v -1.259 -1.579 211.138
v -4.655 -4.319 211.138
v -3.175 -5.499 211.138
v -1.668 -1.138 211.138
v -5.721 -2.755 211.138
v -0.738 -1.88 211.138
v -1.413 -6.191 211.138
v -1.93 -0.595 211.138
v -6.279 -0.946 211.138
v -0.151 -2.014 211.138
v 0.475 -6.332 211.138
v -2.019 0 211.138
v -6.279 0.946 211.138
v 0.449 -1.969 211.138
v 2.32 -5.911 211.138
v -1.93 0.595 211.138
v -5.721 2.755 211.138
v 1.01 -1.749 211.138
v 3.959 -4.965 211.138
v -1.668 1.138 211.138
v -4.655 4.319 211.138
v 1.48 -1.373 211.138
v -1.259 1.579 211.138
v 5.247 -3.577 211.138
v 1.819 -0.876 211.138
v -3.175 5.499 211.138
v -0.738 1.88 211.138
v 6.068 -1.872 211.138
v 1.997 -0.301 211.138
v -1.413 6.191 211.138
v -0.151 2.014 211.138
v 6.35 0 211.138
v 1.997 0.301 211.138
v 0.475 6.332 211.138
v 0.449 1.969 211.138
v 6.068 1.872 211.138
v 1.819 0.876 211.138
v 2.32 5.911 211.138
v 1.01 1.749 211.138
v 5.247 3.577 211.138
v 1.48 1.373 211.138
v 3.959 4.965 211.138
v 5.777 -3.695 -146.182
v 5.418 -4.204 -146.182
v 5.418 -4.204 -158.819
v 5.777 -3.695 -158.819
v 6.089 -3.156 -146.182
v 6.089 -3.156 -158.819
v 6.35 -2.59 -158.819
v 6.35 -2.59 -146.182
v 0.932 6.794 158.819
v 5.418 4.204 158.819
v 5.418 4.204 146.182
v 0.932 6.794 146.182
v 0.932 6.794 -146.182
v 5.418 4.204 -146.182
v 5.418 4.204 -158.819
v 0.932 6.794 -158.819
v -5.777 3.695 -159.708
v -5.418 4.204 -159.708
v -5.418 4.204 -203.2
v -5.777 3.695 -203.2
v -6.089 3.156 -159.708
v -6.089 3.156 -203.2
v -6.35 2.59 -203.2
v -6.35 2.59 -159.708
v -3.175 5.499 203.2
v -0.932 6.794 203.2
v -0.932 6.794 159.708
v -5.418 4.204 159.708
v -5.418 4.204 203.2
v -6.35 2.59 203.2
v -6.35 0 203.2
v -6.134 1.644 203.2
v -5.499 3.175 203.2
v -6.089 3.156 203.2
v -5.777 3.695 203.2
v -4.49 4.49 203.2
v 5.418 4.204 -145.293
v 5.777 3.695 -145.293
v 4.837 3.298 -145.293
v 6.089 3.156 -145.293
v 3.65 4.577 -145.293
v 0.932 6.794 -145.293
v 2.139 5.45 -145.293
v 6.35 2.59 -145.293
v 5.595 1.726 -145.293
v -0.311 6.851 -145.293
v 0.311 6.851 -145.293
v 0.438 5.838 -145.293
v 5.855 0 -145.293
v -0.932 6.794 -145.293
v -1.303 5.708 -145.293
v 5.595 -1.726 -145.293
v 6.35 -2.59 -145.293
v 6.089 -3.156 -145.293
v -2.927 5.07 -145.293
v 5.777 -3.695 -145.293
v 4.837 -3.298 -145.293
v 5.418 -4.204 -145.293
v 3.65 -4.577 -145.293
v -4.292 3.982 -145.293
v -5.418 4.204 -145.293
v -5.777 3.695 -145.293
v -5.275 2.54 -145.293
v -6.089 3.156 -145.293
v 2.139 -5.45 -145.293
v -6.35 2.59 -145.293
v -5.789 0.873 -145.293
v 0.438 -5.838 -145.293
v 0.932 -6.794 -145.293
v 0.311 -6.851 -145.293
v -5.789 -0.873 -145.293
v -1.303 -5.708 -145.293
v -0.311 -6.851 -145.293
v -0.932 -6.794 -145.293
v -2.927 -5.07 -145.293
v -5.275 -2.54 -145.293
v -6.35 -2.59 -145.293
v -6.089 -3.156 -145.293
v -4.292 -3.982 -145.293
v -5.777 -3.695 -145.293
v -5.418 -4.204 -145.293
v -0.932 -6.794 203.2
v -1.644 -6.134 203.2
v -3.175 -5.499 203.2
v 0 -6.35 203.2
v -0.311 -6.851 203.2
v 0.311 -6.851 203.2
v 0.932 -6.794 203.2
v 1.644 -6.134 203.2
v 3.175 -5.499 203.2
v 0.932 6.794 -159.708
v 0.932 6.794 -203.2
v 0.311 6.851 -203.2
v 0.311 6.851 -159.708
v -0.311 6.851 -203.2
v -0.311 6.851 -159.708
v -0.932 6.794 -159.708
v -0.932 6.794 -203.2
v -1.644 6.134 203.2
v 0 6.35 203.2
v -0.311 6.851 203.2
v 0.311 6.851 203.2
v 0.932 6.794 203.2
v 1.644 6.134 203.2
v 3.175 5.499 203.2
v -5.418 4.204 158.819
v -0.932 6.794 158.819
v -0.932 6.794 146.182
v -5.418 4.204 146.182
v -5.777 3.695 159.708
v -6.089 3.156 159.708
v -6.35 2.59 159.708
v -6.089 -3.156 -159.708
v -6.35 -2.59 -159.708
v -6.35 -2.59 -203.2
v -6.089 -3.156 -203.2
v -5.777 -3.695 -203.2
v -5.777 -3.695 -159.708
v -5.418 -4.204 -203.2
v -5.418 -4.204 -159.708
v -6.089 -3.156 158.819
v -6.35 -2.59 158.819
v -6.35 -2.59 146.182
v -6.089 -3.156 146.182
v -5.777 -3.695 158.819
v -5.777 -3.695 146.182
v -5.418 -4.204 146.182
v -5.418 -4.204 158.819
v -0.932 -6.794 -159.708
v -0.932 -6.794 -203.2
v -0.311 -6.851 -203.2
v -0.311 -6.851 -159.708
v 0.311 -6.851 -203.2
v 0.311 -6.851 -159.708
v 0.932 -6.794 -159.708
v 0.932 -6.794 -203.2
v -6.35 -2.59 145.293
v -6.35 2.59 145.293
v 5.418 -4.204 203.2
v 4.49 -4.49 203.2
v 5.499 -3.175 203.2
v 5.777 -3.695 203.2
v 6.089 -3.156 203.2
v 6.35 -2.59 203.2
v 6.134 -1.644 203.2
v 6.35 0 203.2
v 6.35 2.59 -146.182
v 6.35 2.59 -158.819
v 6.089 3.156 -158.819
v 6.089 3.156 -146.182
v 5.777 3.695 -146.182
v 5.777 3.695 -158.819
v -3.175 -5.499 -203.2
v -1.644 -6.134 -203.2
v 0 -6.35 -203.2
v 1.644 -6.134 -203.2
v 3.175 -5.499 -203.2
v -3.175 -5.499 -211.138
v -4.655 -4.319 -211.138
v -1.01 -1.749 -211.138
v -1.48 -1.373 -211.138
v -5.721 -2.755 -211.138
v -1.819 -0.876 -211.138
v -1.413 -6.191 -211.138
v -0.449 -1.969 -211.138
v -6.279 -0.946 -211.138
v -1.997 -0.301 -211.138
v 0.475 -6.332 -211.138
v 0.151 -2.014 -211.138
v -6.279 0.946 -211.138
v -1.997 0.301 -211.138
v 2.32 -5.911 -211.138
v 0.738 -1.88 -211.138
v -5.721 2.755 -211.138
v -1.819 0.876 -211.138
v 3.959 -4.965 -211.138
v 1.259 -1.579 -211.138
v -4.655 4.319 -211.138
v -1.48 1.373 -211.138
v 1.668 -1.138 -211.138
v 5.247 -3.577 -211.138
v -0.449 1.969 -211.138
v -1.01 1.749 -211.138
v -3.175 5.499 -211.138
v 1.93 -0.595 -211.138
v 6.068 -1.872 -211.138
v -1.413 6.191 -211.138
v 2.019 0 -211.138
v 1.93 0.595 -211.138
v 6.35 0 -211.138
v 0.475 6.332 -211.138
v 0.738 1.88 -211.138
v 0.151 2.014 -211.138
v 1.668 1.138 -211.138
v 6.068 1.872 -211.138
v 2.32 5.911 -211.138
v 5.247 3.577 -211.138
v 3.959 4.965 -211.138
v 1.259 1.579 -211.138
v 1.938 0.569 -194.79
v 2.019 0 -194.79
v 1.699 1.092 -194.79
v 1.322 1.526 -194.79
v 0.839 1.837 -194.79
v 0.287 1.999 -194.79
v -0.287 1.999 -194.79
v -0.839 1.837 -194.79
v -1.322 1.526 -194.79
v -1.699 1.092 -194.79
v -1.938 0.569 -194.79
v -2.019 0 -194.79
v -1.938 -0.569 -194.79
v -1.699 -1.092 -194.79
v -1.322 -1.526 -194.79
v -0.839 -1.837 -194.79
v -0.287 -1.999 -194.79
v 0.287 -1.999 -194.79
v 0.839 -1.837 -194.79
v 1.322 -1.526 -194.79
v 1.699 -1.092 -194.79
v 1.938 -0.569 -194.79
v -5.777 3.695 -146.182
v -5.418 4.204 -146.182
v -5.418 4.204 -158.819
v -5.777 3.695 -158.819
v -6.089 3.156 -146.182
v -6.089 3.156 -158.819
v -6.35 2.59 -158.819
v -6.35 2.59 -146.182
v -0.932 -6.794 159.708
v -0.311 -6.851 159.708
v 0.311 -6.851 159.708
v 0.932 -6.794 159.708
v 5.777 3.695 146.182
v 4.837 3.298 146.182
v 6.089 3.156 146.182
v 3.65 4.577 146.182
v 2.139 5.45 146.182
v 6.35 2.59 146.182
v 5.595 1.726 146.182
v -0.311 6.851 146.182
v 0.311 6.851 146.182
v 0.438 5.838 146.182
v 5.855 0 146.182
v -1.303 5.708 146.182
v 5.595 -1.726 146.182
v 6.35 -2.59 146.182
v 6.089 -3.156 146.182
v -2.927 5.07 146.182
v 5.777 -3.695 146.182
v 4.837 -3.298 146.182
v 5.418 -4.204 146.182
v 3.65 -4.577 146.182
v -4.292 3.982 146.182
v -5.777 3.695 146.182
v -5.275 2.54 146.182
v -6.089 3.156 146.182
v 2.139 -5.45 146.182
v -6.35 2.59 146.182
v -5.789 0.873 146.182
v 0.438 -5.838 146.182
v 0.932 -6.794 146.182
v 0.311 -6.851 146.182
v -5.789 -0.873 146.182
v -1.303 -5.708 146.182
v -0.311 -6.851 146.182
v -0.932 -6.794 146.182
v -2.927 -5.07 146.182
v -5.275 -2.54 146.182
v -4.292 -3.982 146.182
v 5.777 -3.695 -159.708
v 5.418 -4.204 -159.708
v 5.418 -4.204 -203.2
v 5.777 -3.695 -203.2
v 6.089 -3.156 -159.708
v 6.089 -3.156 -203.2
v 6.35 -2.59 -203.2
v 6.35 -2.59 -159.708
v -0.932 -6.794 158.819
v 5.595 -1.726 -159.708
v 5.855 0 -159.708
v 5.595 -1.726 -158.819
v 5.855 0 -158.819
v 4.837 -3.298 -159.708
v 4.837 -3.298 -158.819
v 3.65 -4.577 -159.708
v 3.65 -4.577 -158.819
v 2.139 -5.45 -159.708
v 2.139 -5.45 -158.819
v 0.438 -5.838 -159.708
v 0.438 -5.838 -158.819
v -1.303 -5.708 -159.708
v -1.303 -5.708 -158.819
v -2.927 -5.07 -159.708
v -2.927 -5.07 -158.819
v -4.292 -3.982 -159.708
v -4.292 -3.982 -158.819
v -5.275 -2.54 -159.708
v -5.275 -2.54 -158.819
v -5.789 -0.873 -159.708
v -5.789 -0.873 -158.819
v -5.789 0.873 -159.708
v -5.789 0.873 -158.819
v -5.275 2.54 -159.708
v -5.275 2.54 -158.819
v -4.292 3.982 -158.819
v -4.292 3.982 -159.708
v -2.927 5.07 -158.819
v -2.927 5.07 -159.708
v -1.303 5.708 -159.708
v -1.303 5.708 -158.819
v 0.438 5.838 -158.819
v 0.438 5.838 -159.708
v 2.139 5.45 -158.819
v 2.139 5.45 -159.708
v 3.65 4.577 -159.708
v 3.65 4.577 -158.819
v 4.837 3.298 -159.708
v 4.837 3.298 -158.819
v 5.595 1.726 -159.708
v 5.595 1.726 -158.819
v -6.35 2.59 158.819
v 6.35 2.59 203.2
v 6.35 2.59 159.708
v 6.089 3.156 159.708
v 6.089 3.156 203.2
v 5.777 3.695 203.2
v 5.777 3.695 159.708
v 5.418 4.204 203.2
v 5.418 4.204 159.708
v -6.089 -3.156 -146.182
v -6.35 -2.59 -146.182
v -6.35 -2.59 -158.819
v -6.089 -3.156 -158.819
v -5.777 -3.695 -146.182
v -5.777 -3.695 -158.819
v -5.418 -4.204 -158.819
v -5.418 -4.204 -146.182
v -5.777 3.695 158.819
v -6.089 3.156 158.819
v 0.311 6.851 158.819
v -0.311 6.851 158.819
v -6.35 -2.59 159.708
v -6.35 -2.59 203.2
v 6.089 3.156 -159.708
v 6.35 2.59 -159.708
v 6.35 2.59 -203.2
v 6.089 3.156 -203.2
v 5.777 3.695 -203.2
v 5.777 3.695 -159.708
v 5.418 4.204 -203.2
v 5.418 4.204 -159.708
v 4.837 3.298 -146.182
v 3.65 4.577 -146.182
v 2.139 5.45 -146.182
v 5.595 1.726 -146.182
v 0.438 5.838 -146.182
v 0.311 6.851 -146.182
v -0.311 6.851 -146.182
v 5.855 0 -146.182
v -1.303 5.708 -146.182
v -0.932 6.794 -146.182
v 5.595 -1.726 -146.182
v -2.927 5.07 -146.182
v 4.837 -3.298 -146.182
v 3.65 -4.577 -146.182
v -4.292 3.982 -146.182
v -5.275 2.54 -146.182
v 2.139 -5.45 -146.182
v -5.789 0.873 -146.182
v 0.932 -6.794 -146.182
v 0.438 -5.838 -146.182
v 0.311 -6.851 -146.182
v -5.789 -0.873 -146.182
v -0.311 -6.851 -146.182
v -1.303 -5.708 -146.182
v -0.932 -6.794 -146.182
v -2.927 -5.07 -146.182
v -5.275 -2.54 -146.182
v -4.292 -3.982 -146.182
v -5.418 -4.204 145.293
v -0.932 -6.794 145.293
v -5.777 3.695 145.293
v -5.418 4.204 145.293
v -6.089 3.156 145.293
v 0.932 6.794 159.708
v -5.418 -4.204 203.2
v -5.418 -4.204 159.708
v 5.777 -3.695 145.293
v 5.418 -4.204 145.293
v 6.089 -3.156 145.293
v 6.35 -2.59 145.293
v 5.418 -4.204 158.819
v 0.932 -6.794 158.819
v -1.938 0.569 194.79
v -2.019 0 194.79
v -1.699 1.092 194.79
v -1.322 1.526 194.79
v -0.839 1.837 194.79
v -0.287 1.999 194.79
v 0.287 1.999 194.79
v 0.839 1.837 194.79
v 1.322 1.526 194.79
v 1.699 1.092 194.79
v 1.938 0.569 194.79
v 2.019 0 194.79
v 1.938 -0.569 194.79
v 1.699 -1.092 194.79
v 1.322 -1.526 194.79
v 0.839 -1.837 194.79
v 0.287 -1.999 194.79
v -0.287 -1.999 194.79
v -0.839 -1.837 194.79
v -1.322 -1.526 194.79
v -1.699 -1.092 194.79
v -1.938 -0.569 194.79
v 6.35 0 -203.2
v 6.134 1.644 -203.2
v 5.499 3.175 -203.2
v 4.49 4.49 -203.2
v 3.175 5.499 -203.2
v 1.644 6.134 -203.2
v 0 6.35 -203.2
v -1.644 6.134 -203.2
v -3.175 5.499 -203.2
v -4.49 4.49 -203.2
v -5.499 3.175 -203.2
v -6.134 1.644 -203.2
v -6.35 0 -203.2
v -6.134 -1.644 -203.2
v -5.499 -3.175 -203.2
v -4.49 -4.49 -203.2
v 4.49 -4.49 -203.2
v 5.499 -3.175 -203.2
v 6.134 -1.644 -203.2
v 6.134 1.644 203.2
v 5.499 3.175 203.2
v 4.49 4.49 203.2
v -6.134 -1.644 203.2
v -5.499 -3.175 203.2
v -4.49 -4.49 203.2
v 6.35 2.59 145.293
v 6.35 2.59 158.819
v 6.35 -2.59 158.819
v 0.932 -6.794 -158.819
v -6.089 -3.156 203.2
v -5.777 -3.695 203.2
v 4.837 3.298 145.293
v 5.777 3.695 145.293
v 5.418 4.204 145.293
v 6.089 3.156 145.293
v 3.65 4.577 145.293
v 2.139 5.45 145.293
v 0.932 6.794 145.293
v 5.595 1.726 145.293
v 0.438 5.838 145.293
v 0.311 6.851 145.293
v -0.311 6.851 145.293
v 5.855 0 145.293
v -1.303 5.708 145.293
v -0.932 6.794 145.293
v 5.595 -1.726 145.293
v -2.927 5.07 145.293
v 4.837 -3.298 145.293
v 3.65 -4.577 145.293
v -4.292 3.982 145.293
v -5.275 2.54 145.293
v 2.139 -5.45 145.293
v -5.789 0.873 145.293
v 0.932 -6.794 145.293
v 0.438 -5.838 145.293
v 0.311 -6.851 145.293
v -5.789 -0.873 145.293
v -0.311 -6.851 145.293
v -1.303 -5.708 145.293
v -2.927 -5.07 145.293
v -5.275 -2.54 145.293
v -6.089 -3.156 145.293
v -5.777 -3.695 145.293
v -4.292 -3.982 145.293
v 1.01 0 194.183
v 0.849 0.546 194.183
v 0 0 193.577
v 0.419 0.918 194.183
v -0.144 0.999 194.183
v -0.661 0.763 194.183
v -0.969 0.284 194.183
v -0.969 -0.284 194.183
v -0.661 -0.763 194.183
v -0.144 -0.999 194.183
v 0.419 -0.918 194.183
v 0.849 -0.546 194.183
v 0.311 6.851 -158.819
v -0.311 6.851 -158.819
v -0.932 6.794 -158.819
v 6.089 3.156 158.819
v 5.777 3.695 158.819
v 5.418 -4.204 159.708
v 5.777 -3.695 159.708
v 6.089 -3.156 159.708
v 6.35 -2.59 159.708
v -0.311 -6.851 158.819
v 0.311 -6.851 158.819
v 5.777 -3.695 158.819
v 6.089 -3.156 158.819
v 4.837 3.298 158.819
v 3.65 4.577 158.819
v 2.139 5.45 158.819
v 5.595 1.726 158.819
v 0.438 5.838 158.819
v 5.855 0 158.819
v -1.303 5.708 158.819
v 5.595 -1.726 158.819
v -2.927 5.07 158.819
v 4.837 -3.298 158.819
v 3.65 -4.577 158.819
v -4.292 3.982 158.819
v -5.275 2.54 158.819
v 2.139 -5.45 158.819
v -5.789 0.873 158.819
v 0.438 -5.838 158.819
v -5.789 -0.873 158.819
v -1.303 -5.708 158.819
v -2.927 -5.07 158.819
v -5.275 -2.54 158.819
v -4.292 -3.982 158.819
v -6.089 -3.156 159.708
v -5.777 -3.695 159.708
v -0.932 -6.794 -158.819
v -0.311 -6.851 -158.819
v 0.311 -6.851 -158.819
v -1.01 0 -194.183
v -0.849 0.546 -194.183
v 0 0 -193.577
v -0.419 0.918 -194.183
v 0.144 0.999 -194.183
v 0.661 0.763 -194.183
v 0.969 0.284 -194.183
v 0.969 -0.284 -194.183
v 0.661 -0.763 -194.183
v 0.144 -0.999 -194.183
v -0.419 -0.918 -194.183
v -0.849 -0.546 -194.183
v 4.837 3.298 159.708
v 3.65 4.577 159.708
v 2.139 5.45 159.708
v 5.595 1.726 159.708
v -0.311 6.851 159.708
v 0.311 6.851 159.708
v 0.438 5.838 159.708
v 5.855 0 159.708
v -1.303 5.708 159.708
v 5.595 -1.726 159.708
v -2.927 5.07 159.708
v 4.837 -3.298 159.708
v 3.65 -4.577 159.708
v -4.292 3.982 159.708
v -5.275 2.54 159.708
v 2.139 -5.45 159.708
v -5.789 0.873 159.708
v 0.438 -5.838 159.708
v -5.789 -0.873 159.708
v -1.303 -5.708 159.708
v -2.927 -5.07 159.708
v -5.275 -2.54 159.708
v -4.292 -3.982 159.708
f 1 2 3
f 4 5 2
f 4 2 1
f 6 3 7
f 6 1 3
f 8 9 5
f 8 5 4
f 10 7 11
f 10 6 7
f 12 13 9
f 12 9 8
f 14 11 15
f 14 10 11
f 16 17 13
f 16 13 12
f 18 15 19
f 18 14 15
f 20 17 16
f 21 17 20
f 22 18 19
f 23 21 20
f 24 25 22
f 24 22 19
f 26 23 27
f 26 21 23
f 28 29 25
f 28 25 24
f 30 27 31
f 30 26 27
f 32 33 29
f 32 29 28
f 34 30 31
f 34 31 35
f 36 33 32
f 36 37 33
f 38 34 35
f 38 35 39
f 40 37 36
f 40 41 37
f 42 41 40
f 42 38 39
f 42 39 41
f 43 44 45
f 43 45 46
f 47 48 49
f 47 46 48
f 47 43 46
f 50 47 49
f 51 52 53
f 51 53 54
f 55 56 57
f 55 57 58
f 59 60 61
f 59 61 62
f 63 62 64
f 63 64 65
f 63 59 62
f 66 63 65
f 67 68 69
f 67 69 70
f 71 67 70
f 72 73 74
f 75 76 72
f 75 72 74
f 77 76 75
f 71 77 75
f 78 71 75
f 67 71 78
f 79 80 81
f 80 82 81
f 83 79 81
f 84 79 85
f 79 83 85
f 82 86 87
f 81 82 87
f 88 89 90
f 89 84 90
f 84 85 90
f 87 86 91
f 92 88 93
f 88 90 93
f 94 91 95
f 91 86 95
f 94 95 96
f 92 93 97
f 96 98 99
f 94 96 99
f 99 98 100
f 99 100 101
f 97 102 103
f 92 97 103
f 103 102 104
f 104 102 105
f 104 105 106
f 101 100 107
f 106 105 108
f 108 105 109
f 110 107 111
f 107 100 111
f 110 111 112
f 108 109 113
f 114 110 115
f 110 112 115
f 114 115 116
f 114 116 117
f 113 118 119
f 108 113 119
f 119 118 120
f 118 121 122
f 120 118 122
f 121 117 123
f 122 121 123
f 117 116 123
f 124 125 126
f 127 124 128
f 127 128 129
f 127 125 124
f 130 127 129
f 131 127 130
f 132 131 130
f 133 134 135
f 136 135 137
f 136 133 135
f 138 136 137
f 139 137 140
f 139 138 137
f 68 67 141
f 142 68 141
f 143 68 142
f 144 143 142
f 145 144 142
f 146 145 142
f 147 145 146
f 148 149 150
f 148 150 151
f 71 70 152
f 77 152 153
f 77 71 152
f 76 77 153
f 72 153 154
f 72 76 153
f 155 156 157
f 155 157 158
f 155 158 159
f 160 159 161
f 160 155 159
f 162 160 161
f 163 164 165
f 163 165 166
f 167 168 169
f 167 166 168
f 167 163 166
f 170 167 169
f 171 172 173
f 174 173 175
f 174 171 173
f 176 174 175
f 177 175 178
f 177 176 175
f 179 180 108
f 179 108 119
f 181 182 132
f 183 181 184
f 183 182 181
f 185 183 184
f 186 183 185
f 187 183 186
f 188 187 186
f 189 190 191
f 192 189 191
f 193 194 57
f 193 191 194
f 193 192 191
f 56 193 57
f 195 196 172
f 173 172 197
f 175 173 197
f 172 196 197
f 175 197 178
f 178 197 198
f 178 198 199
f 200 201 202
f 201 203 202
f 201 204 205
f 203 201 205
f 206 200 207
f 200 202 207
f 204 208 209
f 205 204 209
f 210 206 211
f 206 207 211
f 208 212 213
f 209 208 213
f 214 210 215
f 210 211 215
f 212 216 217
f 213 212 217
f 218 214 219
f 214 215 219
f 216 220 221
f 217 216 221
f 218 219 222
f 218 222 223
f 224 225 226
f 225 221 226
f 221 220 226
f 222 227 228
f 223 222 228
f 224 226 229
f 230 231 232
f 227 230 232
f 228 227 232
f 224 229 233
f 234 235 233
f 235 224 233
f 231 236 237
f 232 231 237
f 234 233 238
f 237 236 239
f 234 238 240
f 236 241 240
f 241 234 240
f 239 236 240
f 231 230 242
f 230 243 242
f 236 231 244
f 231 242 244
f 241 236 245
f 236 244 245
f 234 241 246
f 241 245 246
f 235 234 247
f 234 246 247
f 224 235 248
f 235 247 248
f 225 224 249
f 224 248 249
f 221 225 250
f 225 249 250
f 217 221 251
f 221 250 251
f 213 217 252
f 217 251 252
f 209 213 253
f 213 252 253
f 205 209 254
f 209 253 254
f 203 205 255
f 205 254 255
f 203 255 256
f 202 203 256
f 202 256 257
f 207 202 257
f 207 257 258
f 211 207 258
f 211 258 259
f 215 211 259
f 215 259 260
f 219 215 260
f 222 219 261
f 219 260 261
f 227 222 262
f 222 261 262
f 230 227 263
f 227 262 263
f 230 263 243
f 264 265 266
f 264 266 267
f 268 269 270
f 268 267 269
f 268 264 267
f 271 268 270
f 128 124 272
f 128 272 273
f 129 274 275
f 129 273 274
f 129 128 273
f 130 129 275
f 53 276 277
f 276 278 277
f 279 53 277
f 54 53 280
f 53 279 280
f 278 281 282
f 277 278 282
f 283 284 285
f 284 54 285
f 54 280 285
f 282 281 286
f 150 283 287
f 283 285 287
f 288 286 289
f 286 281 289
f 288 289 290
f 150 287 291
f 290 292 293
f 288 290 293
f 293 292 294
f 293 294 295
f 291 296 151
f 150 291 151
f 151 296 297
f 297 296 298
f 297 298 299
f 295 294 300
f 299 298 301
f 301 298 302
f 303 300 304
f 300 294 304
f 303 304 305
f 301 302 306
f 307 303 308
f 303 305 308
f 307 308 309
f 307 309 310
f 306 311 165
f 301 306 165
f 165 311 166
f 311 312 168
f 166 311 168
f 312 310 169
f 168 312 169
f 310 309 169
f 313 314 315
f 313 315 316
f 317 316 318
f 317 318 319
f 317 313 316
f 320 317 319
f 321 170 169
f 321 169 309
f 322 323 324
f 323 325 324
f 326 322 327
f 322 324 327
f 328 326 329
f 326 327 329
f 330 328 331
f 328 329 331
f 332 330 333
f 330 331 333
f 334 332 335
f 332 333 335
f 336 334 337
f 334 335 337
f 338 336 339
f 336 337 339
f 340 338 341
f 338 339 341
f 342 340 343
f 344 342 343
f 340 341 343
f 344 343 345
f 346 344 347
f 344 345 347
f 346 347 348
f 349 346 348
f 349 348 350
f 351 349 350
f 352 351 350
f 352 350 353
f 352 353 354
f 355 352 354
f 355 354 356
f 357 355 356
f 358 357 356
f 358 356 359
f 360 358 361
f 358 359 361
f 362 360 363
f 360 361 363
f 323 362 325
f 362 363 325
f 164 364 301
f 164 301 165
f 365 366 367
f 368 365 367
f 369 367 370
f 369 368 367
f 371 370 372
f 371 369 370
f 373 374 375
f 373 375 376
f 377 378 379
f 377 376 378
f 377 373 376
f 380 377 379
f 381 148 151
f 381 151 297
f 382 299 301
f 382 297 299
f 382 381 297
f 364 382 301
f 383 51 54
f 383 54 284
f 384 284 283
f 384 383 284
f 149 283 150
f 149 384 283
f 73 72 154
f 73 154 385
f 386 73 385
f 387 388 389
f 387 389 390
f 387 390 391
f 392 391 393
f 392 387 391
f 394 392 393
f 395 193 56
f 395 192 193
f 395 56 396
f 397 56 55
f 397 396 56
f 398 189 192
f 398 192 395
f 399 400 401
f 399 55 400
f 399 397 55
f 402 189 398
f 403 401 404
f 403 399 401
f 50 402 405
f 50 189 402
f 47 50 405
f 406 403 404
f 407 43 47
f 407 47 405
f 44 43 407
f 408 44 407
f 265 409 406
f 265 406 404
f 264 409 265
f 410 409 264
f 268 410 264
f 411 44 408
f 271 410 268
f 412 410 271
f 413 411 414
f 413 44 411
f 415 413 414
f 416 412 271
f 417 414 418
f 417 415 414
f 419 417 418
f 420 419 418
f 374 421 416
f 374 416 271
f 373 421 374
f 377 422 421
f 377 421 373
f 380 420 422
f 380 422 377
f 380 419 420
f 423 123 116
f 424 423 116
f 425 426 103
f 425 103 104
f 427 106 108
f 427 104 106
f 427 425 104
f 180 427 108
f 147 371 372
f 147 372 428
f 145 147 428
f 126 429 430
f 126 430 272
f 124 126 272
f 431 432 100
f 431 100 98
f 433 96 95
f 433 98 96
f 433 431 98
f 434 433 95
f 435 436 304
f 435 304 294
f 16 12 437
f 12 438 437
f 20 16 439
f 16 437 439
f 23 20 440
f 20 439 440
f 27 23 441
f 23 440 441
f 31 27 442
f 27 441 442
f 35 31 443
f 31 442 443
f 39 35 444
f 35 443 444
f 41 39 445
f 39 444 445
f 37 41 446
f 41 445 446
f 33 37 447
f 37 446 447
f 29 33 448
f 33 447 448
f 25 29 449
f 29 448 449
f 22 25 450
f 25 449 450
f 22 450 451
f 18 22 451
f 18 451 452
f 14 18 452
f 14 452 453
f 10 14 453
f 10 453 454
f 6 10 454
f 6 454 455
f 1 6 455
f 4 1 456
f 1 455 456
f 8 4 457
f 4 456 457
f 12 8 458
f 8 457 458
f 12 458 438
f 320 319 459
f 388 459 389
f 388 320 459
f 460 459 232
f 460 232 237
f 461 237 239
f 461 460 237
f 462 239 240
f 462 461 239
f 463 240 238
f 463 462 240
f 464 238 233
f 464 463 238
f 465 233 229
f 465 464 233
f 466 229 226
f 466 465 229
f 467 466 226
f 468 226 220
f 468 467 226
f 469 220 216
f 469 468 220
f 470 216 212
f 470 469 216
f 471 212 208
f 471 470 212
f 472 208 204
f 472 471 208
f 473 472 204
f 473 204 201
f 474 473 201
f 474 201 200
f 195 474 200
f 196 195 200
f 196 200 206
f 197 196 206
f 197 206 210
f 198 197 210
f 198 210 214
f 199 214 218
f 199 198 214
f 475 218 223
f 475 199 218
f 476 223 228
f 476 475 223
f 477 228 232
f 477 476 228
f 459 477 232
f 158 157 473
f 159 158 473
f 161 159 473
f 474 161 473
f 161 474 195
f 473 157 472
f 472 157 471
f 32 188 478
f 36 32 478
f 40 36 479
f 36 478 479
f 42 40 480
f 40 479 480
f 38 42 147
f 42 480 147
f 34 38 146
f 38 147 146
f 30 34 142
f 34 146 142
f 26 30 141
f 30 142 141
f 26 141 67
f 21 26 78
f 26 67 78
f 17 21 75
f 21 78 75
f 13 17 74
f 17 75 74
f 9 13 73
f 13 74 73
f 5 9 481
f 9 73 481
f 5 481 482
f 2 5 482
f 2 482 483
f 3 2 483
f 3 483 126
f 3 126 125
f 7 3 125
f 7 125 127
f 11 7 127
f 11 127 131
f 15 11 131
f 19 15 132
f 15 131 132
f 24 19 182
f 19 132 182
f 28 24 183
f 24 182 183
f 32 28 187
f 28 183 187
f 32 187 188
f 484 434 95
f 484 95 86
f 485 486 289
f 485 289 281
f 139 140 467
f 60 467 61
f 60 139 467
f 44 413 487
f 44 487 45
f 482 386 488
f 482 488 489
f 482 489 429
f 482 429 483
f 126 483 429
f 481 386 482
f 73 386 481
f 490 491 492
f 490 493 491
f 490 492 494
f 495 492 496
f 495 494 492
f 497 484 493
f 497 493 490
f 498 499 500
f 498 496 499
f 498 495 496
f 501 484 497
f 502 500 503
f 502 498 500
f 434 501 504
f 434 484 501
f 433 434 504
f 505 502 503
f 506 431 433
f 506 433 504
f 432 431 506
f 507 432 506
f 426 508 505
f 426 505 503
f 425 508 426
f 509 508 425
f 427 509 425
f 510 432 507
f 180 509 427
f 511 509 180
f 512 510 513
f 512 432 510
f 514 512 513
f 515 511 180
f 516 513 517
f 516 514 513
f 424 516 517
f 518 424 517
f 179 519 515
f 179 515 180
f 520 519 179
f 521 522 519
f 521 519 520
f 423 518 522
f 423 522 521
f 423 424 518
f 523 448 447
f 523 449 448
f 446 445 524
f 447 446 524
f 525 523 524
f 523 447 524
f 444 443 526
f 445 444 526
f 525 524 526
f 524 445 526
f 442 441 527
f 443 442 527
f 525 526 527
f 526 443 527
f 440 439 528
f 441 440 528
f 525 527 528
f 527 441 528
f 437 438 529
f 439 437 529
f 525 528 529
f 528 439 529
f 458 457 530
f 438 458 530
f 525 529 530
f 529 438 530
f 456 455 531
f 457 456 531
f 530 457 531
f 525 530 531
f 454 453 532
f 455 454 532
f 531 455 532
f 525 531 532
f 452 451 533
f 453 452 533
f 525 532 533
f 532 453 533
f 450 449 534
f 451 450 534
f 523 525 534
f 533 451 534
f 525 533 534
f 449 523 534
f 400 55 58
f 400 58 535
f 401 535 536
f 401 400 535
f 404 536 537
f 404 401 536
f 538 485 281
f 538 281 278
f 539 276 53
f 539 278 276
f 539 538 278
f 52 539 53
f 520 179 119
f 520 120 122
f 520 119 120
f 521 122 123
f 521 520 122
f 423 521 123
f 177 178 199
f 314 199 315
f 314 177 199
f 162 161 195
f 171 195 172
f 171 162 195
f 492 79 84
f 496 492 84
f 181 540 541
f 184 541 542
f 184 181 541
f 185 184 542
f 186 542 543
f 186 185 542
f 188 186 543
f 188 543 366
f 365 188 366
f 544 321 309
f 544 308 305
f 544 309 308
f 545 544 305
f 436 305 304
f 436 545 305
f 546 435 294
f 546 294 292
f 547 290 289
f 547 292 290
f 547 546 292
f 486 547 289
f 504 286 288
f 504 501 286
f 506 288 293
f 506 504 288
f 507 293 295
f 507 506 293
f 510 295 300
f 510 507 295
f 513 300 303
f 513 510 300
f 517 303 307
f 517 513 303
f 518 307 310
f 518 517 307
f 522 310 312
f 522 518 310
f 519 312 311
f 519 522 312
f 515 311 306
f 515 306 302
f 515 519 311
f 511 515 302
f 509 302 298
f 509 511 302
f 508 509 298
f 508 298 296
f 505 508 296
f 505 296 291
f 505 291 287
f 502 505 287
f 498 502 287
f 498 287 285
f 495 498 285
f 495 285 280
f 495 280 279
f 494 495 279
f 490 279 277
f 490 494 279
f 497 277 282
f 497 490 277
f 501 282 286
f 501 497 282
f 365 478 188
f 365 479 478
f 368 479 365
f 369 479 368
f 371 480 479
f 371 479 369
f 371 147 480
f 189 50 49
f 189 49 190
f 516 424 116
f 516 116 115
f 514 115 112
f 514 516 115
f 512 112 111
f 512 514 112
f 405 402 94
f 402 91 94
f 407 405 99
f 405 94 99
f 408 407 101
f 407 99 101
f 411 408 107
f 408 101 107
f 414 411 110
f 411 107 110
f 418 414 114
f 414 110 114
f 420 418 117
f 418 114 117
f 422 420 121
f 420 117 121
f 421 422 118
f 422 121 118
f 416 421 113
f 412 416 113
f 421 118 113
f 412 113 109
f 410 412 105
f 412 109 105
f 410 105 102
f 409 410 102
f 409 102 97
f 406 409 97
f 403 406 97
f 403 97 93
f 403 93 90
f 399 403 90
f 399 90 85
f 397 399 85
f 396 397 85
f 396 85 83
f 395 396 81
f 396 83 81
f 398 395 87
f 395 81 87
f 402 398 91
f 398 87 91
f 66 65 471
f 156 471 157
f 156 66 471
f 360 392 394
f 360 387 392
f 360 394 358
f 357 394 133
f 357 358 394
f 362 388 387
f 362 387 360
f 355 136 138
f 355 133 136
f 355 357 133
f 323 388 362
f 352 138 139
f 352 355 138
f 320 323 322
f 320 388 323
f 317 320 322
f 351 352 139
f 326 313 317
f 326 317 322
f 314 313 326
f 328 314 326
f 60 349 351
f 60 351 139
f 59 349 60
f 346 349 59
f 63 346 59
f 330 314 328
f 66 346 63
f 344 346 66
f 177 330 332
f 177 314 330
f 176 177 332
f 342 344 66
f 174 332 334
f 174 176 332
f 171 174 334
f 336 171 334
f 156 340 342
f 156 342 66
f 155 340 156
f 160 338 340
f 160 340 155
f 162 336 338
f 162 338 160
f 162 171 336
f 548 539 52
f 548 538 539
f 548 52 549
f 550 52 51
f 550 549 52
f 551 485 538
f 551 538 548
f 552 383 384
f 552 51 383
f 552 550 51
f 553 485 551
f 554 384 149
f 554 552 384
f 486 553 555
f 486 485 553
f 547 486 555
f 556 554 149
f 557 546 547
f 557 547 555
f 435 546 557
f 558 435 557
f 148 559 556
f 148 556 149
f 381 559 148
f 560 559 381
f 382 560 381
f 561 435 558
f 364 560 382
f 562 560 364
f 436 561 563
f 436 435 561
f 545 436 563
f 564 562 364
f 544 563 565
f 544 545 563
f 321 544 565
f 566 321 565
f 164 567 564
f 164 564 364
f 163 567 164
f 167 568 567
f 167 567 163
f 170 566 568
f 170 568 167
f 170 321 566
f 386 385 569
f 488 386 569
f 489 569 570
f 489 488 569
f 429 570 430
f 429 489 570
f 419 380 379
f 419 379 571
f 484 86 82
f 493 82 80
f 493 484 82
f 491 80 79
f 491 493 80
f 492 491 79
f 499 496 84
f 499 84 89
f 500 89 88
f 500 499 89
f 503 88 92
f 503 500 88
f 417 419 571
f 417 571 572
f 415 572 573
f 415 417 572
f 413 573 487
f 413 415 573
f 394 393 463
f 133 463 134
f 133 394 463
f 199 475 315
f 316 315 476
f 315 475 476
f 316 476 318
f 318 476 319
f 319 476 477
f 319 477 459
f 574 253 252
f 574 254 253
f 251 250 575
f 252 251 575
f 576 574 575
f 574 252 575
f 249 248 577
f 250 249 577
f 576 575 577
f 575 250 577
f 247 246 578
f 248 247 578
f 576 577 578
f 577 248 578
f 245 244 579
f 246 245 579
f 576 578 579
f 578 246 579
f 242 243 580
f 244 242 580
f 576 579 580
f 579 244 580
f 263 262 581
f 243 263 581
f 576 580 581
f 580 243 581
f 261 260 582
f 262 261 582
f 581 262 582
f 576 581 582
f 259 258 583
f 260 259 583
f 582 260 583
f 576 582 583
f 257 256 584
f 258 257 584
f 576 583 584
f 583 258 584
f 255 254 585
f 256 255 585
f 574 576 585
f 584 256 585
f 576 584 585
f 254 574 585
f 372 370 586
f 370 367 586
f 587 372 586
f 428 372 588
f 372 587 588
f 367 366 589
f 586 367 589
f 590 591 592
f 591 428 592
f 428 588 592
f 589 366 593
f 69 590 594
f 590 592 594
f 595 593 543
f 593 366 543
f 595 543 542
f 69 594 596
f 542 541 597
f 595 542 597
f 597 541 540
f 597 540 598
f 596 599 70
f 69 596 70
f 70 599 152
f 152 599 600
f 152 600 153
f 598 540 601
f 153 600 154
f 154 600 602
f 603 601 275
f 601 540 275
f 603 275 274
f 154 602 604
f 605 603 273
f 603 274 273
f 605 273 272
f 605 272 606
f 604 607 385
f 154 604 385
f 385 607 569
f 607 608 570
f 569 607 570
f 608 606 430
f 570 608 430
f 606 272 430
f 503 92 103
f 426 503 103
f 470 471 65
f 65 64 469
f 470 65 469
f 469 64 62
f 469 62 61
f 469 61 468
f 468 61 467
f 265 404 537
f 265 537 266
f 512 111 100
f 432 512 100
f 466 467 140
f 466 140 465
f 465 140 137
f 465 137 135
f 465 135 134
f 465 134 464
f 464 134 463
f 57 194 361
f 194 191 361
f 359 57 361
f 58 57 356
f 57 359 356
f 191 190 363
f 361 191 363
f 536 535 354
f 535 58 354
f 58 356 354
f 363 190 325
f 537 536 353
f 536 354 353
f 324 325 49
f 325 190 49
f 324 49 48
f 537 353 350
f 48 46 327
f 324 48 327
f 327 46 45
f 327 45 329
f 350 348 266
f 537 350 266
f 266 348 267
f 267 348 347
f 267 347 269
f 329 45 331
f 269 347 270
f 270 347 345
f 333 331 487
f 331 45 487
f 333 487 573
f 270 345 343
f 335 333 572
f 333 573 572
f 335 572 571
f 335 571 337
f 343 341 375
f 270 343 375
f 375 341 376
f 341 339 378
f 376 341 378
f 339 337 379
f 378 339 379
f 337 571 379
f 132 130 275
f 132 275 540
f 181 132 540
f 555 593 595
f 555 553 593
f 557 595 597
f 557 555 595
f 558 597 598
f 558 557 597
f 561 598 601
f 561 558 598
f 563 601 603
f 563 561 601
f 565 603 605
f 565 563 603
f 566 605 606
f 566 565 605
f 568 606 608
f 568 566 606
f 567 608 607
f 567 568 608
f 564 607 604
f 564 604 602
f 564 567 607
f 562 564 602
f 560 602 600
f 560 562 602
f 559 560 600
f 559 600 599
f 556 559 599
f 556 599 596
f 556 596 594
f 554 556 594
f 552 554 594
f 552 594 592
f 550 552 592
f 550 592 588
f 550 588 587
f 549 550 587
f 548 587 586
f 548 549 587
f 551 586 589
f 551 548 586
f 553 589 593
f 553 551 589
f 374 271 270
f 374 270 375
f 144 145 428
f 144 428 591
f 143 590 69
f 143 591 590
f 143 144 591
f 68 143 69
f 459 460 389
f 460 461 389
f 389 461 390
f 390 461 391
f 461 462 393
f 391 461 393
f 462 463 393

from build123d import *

# Parameters (mm, degrees)
BOSS_EXTRUDE1_DEPTH                  = 203.2
SKETCH6_R                            = 6.35
BOSS_EXTRUDE2_DEPTH                  = 7.9375
F_10_32_TAPPED_HOLE1_D               = 4.0386
F_10_32_TAPPED_HOLE1_DEPTH           = 16.34744
F_10_32_TAPPED_HOLE1_TIP             = 1.213317848
F_10_32_TAPPED_HOLE1_ON_FACE_2_D     = 4.0386
F_10_32_TAPPED_HOLE1_ON_FACE_2_DEPTH = 16.34744
F_10_32_TAPPED_HOLE1_ON_FACE_2_TIP   = 1.213317848
SKETCH5_W                            = 0.889
SKETCH5_H                            = 1.0033


with BuildPart() as part:
    # Sketch1 → Boss-Extrude1 (new, symmetric)
    with BuildSketch(Plane.XY):
        with BuildLine():
            ThreePointArc((0.93173274, 6.79441227), (0, 6.858), (-0.93173274, 6.79441227))
            Line((-0.93173274, 6.79441227), (-5.41826726, 4.204110358))
            ThreePointArc((-5.41826726, 4.204110358), (-5.939202219, 3.429), (-6.35, 2.590301913))
            Line((-6.35, 2.590301913), (-6.35, -2.590301913))
            ThreePointArc((-6.35, -2.590301913), (-5.939202219, -3.429), (-5.41826726, -4.204110358))
            Line((-5.41826726, -4.204110358), (-0.93173274, -6.79441227))
            ThreePointArc((-0.93173274, -6.79441227), (0, -6.858), (0.93173274, -6.79441227))
            Line((0.93173274, -6.79441227), (5.41826726, -4.204110358))
            ThreePointArc((5.41826726, -4.204110358), (5.939202219, -3.429), (6.35, -2.590301913))
            Line((6.35, -2.590301913), (6.35, 2.590301913))
            ThreePointArc((6.35, 2.590301913), (5.939202219, 3.429), (5.41826726, 4.204110358))
            Line((5.41826726, 4.204110358), (0.93173274, 6.79441227))
        make_face()
    extrude(amount=BOSS_EXTRUDE1_DEPTH, both=True)

    # Sketch6 → Boss-Extrude2 (add)
    with BuildSketch(Plane.XY.offset(203.2)):
        Circle(SKETCH6_R)
    boss_extrude2 = extrude(amount=BOSS_EXTRUDE2_DEPTH)

    # Mirror2: Boss-Extrude2 across plane
    add(boss_extrude2.mirror(Plane.XY))

    # #10-32 Tapped Hole1
    with Locations(Plane.XY.offset(211.1375)):
        with Locations((0, 0)):
            Hole(F_10_32_TAPPED_HOLE1_D / 2, depth=F_10_32_TAPPED_HOLE1_DEPTH)
            with Locations((0, 0, -(F_10_32_TAPPED_HOLE1_DEPTH + F_10_32_TAPPED_HOLE1_TIP / 2))):  # 118° drill point
                Cone(0, F_10_32_TAPPED_HOLE1_D / 2, F_10_32_TAPPED_HOLE1_TIP, mode=Mode.SUBTRACT)

    # #10-32 Tapped Hole1 on face 2
    with Locations(Plane(origin=(0, 0, -211.1375), x_dir=(-1, 0, 0), z_dir=(0, 0, -1))):
        with Locations((0, 0)):
            Hole(F_10_32_TAPPED_HOLE1_ON_FACE_2_D / 2, depth=F_10_32_TAPPED_HOLE1_ON_FACE_2_DEPTH)
            with Locations((0, 0, -(F_10_32_TAPPED_HOLE1_ON_FACE_2_DEPTH + F_10_32_TAPPED_HOLE1_ON_FACE_2_TIP / 2))):  # 118° drill point
                Cone(0, F_10_32_TAPPED_HOLE1_ON_FACE_2_D / 2, F_10_32_TAPPED_HOLE1_ON_FACE_2_TIP, mode=Mode.SUBTRACT)

    # Sketch5 → Cut-Revolve1 (revolve, cut)
    with BuildSketch(Plane(origin=(0, 0, 0), x_dir=(0, 0, -1), z_dir=(1, 0, 0)), mode=Mode.PRIVATE) as cut_revolve1_sk:
        with Locations((-159.26308, 6.35635)):
            Rectangle(SKETCH5_W, SKETCH5_H)
        with Locations((-145.73758, 6.35635)):
            Rectangle(SKETCH5_W, SKETCH5_H)
    cut_revolve1 = revolve(cut_revolve1_sk.sketch.rotate(Axis((0, 0, 165.047176272), (0, 0, -1)), 90), axis=Axis((0, 0, 165.047176272), (0, 0, -1)), mode=Mode.SUBTRACT)

    # Mirror1: Cut-Revolve1 across plane
    add(cut_revolve1.mirror(Plane.XY), mode=Mode.SUBTRACT)


solid = part.part
